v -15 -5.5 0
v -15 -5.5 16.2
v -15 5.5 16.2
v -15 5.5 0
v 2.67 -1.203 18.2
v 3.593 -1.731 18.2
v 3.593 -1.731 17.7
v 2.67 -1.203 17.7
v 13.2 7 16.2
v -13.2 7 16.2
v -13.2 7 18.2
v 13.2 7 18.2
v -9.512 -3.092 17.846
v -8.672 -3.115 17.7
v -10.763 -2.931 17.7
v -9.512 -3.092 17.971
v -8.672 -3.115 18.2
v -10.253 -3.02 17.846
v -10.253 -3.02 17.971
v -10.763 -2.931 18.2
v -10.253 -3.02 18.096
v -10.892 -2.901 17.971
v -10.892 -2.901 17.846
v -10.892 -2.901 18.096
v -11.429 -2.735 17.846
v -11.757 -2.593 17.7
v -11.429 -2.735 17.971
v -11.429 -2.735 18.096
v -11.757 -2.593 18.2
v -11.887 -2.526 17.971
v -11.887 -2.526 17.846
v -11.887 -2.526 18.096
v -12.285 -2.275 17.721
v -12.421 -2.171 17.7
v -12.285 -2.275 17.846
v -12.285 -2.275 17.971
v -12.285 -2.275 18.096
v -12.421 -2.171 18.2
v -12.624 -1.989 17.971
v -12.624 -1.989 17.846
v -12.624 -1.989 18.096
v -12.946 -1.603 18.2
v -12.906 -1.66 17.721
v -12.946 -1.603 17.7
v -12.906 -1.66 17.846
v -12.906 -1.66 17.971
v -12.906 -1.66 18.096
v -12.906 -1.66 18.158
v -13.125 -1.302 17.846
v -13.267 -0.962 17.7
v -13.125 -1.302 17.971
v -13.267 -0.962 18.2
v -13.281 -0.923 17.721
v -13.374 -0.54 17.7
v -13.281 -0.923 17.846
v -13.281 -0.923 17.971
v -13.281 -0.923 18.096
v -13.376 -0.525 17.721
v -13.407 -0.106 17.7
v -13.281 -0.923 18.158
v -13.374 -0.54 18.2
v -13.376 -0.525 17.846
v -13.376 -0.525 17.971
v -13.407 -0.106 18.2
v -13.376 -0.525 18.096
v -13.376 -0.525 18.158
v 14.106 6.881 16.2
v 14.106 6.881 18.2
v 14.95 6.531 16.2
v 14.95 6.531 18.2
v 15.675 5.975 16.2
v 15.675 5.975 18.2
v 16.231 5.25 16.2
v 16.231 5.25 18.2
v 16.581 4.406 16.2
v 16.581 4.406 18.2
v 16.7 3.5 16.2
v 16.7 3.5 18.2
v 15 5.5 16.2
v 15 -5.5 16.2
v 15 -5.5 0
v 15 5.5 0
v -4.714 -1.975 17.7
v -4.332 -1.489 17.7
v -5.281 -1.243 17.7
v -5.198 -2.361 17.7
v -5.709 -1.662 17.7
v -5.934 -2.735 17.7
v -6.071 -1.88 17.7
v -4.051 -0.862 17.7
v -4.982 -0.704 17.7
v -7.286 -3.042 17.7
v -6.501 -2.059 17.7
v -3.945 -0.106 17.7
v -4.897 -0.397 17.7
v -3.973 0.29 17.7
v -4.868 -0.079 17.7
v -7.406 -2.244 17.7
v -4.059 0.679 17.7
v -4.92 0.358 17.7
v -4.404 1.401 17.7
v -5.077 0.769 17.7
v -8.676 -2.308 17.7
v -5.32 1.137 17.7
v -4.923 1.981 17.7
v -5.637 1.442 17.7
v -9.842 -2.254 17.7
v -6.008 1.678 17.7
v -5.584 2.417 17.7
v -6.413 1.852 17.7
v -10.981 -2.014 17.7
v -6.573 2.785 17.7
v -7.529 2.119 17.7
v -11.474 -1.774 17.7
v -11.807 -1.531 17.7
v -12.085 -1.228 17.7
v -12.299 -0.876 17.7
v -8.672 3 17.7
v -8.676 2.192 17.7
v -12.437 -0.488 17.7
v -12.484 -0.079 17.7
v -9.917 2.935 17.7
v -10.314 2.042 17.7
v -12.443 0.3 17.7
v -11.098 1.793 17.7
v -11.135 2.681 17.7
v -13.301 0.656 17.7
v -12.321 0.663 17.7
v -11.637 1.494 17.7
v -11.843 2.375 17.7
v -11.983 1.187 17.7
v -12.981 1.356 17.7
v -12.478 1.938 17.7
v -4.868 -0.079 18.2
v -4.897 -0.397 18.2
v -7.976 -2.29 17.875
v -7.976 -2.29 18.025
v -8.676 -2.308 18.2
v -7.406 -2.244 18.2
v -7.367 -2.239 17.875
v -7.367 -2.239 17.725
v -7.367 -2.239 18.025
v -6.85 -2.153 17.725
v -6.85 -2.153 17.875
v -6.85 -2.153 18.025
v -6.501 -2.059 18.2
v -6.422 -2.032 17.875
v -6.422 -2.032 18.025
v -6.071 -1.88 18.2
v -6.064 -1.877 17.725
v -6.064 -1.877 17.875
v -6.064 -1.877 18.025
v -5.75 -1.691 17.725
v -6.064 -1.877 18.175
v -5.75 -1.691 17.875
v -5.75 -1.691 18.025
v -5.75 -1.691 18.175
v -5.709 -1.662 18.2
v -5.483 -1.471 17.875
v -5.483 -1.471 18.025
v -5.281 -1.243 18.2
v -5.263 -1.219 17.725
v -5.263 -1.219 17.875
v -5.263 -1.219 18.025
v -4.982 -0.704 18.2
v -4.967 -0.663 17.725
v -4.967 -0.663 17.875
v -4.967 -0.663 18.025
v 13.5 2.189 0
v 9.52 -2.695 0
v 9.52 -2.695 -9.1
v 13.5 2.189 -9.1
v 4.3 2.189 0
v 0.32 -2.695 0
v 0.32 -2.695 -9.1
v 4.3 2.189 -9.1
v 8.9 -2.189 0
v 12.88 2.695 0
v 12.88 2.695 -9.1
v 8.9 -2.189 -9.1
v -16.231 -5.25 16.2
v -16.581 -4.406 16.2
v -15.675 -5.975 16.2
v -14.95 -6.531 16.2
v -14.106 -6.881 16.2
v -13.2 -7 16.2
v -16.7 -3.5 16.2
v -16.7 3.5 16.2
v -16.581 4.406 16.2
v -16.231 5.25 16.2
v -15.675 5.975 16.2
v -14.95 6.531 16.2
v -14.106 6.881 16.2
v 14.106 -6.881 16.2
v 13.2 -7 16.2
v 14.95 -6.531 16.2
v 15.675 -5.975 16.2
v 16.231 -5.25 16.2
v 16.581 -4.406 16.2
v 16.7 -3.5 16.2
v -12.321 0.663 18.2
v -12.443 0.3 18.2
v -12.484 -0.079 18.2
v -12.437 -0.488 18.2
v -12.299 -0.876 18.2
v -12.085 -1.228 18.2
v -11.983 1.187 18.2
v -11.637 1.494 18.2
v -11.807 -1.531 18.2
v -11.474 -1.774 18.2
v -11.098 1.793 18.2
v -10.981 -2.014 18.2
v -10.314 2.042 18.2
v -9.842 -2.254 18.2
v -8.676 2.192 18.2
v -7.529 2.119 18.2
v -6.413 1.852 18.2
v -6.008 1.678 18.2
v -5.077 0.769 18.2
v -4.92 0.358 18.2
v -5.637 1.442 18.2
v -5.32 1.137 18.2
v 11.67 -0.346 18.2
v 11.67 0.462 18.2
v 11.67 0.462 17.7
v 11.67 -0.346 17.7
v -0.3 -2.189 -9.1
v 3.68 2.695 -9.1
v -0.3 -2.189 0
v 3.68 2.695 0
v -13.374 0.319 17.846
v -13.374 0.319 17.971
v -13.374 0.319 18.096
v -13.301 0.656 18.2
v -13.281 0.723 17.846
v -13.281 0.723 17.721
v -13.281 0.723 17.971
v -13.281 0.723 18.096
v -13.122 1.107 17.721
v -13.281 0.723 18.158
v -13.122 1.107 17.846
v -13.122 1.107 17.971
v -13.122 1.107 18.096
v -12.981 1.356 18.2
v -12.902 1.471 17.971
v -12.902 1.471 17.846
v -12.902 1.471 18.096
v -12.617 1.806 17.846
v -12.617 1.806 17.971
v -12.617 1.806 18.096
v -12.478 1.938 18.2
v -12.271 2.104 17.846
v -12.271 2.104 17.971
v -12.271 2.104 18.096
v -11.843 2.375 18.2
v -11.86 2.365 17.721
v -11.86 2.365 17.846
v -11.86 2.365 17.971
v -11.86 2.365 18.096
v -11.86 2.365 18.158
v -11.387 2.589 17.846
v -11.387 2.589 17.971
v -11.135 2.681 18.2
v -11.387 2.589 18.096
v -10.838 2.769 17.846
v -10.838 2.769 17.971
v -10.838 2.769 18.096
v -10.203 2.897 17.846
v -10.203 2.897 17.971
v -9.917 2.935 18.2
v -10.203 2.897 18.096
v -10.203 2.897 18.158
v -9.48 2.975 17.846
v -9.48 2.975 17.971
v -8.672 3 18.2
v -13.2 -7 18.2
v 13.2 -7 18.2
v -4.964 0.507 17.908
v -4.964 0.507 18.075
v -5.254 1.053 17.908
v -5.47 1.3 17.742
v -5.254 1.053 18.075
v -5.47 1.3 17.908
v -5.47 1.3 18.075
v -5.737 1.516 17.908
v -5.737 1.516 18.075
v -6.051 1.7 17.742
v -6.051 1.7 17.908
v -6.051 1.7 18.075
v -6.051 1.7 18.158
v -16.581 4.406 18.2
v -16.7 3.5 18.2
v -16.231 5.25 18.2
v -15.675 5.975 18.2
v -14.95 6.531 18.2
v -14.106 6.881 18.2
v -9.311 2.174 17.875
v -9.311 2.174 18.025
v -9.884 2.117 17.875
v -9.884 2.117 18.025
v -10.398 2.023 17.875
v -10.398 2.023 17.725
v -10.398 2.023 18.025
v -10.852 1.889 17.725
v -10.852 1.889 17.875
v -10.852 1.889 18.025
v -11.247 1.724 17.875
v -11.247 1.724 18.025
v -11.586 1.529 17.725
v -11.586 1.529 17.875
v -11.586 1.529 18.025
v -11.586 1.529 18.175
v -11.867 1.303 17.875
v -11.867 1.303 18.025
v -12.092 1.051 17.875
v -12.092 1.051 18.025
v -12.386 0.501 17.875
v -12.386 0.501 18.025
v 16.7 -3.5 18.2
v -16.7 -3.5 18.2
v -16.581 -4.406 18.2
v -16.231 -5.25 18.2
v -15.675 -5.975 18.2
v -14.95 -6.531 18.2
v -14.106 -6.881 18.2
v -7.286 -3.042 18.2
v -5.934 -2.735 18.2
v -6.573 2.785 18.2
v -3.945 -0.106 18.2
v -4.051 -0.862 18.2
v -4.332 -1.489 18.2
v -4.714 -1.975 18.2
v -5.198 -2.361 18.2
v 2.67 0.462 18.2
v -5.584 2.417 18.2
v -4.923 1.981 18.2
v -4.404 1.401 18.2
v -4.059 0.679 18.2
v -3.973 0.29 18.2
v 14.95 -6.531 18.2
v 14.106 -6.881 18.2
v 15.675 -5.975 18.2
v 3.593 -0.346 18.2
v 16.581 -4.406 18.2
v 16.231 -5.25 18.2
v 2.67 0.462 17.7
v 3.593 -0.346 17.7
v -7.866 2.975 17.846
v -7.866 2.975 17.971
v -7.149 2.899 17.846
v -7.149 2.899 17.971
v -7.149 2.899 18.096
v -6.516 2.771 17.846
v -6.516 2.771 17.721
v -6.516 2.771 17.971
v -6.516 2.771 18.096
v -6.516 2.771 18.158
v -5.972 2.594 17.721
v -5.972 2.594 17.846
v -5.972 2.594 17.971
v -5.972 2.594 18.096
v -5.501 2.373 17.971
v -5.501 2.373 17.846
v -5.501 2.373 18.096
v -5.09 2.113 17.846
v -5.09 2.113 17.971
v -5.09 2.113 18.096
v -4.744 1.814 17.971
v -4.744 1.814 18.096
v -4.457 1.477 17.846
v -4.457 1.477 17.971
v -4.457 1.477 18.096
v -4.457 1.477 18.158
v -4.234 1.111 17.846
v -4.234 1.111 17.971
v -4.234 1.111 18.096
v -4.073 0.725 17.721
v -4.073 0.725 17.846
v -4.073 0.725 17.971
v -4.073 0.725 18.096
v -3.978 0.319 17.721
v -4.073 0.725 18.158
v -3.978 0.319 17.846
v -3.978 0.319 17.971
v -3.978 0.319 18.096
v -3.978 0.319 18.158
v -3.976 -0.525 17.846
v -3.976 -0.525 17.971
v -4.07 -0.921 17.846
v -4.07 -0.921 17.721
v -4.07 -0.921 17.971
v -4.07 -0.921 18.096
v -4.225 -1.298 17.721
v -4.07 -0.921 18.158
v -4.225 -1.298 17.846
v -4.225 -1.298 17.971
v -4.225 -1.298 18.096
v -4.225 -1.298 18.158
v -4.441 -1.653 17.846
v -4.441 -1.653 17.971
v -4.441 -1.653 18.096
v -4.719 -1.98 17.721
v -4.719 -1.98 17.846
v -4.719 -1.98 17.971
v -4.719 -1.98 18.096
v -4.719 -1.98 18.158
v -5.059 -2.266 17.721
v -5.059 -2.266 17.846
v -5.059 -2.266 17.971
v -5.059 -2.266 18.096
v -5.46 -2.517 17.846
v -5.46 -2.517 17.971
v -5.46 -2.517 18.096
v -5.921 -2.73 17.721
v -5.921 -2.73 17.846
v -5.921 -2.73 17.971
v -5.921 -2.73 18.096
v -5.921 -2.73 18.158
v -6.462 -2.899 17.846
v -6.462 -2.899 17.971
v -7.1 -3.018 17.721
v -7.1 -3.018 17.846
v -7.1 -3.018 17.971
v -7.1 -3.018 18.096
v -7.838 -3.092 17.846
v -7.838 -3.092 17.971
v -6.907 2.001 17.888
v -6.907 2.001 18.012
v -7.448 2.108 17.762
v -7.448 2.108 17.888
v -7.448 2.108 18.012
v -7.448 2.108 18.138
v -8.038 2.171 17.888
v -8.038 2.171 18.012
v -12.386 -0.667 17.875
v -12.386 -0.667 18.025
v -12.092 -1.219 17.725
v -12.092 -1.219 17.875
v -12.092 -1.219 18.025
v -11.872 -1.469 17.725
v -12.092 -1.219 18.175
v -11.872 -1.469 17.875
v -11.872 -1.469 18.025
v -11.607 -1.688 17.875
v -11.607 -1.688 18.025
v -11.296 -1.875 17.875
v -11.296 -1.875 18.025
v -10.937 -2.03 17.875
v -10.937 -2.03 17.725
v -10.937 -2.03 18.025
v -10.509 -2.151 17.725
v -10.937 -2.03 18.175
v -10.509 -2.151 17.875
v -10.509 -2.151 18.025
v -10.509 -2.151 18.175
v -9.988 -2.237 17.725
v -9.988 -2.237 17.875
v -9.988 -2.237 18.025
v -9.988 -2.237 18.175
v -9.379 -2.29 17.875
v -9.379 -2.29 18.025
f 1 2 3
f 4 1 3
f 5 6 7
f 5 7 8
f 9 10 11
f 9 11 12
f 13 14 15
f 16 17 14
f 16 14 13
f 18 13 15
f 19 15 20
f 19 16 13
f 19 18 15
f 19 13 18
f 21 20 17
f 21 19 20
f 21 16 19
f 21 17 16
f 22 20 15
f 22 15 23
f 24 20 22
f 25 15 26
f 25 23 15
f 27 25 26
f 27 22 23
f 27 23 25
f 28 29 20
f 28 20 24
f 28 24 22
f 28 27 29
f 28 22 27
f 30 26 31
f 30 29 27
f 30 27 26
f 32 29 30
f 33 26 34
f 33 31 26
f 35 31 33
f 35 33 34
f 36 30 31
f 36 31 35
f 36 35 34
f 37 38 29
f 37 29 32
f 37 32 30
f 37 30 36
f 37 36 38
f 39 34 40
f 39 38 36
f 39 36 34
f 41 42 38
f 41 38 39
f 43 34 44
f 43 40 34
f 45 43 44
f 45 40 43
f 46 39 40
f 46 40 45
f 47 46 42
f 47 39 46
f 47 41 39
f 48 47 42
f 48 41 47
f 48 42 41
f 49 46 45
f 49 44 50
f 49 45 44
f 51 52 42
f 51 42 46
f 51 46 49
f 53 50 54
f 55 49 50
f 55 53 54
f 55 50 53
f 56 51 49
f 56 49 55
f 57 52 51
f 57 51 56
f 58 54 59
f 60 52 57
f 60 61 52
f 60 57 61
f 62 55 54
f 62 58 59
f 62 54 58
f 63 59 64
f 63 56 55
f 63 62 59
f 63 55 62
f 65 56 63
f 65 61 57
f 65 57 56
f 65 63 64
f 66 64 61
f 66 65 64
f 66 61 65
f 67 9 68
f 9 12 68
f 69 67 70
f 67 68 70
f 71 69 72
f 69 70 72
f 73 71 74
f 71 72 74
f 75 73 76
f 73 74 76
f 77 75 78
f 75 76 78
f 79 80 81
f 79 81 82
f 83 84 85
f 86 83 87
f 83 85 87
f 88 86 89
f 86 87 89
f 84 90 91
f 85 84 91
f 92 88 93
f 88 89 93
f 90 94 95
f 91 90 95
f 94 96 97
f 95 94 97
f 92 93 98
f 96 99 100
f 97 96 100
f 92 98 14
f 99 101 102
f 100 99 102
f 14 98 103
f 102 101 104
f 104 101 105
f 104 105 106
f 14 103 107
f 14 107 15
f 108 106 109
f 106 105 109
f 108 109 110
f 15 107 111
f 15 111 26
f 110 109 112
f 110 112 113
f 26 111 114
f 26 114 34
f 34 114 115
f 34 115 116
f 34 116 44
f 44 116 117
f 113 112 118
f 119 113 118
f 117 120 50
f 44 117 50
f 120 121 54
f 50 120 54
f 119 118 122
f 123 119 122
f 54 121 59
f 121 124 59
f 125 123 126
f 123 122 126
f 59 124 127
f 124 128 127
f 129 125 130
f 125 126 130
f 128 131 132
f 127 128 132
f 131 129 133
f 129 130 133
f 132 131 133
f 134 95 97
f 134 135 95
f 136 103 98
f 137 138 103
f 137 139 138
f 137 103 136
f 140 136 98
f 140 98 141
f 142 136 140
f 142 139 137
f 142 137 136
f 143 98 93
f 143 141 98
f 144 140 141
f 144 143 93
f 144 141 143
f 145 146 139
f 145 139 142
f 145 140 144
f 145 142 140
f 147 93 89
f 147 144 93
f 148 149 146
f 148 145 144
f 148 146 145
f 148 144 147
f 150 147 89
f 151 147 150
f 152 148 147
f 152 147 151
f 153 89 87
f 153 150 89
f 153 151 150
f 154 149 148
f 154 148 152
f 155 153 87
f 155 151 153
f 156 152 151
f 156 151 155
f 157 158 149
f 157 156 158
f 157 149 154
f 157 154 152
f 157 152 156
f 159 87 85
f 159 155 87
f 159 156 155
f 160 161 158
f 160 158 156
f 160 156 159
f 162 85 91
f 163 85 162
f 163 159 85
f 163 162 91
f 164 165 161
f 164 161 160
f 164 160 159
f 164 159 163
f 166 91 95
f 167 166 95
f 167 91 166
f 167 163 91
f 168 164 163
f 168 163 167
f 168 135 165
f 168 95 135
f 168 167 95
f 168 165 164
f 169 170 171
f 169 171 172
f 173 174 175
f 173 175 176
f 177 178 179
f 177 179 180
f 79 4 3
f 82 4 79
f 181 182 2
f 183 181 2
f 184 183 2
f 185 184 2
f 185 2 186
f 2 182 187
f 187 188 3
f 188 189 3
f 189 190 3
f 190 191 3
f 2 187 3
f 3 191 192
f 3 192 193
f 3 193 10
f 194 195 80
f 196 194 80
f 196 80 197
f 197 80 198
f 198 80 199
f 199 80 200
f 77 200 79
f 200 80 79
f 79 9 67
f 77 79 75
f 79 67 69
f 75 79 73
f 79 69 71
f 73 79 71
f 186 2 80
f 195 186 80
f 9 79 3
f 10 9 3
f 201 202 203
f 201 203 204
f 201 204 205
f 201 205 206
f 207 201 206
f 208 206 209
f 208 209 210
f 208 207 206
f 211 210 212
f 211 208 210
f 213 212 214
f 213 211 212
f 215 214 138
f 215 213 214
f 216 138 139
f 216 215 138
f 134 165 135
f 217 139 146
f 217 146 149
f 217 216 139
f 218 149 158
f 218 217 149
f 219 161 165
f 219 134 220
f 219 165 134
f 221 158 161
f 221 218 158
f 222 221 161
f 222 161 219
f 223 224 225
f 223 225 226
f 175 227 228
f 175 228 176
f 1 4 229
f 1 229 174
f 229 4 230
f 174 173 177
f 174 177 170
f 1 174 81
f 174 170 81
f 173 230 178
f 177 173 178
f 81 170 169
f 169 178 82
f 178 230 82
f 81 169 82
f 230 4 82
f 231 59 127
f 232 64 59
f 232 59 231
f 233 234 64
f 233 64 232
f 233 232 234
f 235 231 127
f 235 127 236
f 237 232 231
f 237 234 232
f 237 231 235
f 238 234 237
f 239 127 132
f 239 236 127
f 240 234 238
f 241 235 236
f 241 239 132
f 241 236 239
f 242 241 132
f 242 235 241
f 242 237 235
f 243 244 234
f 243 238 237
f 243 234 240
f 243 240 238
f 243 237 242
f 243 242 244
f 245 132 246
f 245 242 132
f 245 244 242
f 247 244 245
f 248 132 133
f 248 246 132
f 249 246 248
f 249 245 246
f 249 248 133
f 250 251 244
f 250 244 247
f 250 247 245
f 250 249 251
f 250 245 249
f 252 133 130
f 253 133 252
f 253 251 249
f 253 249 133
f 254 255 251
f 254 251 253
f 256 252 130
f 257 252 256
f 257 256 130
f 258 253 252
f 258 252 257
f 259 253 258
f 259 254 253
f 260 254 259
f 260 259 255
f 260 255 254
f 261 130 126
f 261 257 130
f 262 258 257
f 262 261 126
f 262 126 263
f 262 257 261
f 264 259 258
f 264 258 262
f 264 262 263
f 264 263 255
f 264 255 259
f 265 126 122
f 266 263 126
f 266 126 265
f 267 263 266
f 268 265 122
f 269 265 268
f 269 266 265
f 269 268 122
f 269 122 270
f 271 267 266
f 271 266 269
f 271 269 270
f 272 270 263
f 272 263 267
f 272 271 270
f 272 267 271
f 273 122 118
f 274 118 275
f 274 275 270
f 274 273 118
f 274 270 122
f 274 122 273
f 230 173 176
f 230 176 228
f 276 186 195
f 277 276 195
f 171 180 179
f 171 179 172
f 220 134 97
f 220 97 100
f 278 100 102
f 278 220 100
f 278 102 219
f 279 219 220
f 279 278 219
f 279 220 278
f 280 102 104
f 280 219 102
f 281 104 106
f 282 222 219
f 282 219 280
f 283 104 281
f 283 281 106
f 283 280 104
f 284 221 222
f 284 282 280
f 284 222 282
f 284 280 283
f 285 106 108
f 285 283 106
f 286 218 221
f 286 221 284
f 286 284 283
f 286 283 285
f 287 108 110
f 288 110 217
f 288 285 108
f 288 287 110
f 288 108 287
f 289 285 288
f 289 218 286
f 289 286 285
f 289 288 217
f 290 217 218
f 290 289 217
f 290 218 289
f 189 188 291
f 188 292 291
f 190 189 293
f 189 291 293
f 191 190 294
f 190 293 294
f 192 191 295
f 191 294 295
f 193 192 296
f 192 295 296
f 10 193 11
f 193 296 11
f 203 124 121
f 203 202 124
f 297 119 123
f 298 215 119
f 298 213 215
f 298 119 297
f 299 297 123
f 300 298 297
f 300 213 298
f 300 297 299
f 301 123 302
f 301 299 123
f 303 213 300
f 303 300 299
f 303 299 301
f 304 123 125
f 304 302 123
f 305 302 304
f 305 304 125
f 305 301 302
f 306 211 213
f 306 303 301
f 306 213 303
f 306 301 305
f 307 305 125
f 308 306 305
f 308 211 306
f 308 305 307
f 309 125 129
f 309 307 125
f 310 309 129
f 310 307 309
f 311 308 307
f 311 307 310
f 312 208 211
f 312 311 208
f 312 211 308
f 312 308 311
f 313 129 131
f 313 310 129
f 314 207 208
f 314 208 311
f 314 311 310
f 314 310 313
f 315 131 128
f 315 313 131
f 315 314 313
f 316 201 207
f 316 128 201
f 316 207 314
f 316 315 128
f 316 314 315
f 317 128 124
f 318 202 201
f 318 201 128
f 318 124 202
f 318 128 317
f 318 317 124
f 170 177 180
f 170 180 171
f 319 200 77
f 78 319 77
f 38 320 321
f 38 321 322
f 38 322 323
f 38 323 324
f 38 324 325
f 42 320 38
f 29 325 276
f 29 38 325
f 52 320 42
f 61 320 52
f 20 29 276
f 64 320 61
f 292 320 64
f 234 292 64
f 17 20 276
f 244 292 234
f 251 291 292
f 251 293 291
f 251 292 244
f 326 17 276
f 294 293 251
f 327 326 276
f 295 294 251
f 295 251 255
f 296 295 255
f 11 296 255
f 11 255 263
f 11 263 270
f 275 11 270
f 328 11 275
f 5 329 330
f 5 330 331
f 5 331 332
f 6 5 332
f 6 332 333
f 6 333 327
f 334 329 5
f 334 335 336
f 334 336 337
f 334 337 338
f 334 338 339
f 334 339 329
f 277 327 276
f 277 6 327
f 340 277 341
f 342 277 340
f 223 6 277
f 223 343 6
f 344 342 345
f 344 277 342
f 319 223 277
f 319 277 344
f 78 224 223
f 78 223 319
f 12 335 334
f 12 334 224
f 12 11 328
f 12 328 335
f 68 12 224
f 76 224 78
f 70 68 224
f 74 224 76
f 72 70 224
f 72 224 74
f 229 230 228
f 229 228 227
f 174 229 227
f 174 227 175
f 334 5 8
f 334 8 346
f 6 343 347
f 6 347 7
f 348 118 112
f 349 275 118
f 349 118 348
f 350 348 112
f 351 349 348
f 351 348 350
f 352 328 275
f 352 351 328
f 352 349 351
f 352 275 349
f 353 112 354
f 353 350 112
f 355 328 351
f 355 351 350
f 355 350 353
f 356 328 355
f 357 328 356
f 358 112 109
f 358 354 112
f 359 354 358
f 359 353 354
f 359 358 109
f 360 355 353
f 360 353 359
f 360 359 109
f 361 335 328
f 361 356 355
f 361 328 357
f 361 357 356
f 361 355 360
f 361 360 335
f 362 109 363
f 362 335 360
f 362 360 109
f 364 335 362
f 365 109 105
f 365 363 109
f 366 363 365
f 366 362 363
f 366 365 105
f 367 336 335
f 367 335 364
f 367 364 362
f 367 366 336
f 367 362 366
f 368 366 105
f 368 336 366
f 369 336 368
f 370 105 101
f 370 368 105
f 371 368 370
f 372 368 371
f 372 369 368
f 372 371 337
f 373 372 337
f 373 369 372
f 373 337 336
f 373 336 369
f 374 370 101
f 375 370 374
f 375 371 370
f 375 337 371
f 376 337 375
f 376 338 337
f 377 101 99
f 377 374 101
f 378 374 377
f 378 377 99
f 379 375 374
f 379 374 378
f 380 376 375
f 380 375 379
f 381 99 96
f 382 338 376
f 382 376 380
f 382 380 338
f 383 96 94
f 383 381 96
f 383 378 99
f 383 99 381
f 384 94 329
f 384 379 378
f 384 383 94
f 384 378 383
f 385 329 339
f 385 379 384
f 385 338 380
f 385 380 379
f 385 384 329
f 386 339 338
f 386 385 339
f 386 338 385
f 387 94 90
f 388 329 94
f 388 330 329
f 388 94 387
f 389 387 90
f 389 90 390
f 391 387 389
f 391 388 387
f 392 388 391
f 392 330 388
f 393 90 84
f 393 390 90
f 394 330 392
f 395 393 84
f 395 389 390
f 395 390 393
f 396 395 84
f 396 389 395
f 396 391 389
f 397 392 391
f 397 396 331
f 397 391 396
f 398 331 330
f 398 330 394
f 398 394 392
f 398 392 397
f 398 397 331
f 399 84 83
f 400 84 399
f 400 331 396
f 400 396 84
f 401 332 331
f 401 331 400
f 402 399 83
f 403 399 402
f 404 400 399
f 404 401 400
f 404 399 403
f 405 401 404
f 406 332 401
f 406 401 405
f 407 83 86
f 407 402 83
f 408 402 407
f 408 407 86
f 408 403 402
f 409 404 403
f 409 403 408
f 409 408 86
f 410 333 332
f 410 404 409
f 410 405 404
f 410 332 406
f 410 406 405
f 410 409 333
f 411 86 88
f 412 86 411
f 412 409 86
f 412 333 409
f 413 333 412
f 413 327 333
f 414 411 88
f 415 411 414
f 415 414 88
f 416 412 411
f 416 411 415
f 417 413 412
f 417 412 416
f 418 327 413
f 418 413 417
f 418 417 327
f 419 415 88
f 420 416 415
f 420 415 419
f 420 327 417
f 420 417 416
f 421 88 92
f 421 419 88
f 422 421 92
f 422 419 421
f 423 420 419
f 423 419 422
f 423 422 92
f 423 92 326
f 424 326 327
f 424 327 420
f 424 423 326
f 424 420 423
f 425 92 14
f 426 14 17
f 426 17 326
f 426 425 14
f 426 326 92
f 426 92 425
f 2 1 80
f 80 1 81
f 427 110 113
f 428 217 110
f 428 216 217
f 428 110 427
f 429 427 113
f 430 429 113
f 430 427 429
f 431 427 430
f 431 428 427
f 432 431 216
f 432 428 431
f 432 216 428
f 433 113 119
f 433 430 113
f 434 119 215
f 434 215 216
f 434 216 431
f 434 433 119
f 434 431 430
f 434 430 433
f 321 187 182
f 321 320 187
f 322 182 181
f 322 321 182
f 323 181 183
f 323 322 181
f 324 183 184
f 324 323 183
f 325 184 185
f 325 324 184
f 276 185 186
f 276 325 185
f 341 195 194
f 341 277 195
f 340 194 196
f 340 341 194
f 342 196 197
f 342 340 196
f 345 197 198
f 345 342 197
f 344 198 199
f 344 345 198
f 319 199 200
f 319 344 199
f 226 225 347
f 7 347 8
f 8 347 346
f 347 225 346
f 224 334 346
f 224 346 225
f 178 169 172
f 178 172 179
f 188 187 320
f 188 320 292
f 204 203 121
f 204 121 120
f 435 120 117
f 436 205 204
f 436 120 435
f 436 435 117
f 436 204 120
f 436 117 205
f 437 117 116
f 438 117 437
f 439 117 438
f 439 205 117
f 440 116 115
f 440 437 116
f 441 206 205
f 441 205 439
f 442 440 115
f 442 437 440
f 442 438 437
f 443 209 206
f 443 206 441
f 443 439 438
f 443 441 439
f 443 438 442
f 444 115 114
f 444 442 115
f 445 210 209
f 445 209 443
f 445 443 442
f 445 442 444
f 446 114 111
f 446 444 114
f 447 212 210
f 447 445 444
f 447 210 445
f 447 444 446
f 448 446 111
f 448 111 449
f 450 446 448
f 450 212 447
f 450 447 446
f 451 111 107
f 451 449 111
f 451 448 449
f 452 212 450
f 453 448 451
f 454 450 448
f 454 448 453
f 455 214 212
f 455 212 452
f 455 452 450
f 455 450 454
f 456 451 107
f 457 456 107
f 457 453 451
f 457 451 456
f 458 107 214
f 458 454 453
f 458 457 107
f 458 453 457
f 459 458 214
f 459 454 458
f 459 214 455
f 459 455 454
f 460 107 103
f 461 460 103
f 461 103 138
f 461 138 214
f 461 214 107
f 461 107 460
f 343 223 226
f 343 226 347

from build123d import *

# Parameters (mm, degrees)
ESQUISSE1_W             = 30
ESQUISSE1_H             = 11
BOSS_EXTRU_1_DEPTH      = 16.2
BOSS_EXTRU_2_DEPTH      = 9.1
ESQUISSE3_W             = 33.4
ESQUISSE3_H             = 14
BOSS_EXTRU_3_DEPTH      = 2
CONG_1_R                = 3.5
ENL_V_MAT_EXTRU_1_DEPTH = 0.5


with BuildPart() as part:
    # Esquisse1 → Boss.-Extru.1 (new body)
    with BuildSketch(Plane.XY):
        Rectangle(ESQUISSE1_W, ESQUISSE1_H)
    extrude(amount=BOSS_EXTRU_1_DEPTH)

    # Esquisse2 → Boss.-Extru.2 (add)
    with BuildSketch(Plane(origin=(0, 0, 0), x_dir=(-1, 0, 0), z_dir=(0, 0, -1))):
        Polygon((-9.520156546, -2.694554874), (-13.5, 2.189177928), (-12.879843454, 2.694554874), (-8.9, -2.189177928), align=None)
        Polygon((-0.320156546, -2.694554874), (-4.3, 2.189177928), (-3.679843454, 2.694554874), (0.3, -2.189177928), align=None)
    extrude(amount=BOSS_EXTRU_2_DEPTH)

    # Esquisse3 → Boss.-Extru.3 (add)
    with BuildSketch(Plane.XY.offset(16.2)):
        Rectangle(ESQUISSE3_W, ESQUISSE3_H)
    extrude(amount=BOSS_EXTRU_3_DEPTH)

    # Congé1
    cong_1_edges = [part.edges().sort_by_distance(p)[0] for p in [
        (16.7, -7, 17.2),
        (16.7, 7, 17.2),
        (-16.7, 7, 17.2),
        (-16.7, -7, 17.2),
    ]]
    fillet(cong_1_edges, radius=CONG_1_R)

    # Esquisse5 → Enlèv. mat.-Extru.1 (cut)
    # profile 1 of 2: a face of its own
    with BuildSketch(Plane.XY.offset(18.2)):
        with BuildLine():
            add(Edge.make_bspline(
                [(-8.672344116, -3.115384615), (-8.816594542, -3.11454114), (-9.096803073, -3.112902677), (-9.505106438, -3.094675309), (-9.888147182, -3.064395858), (-10.245943635, -3.022899755), (-10.578588179, -2.972402097), (-10.885191819, -2.904990826), (-11.167173735, -2.828329399), (-11.425453052, -2.739480033), (-11.663510816, -2.639226475), (-11.885744181, -2.530107135), (-12.0918336, -2.40780713), (-12.285008724, -2.279261226), (-12.462319222, -2.139465144), (-12.62580805, -1.99141638), (-12.774096473, -1.832153938), (-12.907286041, -1.663222517), (-13.024073857, -1.485767046), (-13.127578093, -1.304636715), (-13.212833981, -1.116595132), (-13.282575645, -0.924117757), (-13.339507374, -0.72679892), (-13.378613639, -0.524688996), (-13.403175484, -0.317319479), (-13.405526699, -0.177353753), (-13.406719116, -0.106370192)],
                knots=[0, 0, 0, 0, 1.646148282, 3.197666765, 4.66315463, 6.030252048, 7.307778049, 8.501004361, 9.610818041, 10.641065266, 11.615491391, 12.557119604, 13.464013759, 14.348536654, 15.203310953, 16.038349431, 16.863300206, 17.683791446, 18.490318933, 19.285717724, 20.06220424, 20.843281102, 21.620494212, 22.403315558, 23.190242141, 24, 24, 24, 24], degree=3))
            add(Edge.make_bspline(
                [(-13.406719116, -0.106370192), (-13.405725902, -0.034758535), (-13.403749756, 0.107723458), (-13.375934308, 0.317616697), (-13.340032104, 0.523853953), (-13.28245088, 0.7233062), (-13.213547479, 0.919744698), (-13.122630536, 1.108284414), (-13.0237513, 1.295581798), (-12.90312695, 1.47312818), (-12.769817193, 1.646228322), (-12.618476538, 1.808491632), (-12.453293353, 1.964065993), (-12.270583572, 2.107075425), (-12.073148677, 2.243649111), (-11.859333594, 2.368602577), (-11.629612167, 2.484534626), (-11.385049352, 2.593624475), (-11.119112495, 2.689020666), (-10.833460316, 2.773835506), (-10.525506096, 2.843355619), (-10.196965336, 2.90084753), (-9.846210449, 2.945472196), (-9.473952104, 2.977949275), (-9.079957413, 2.995110587), (-8.810580002, 2.99834183), (-8.672344116, 3)],
                knots=[0, 0, 0, 0, 0.810910589, 1.61342667, 2.396193133, 3.181089899, 3.963115317, 4.752255436, 5.550715454, 6.36105385, 7.181178335, 8.024612154, 8.872680183, 9.750181803, 10.651284446, 11.591556747, 12.554036451, 13.566402641, 14.62422919, 15.753422176, 16.94128843, 18.199818041, 19.531985927, 20.947085226, 22.433341622, 24, 24, 24, 24], degree=3))
            add(Edge.make_bspline(
                [(-8.672344116, 3), (-8.534712415, 2.998305349), (-8.265942373, 2.994995999), (-7.873701987, 2.978317337), (-7.503450196, 2.944678932), (-7.154792256, 2.903215364), (-6.827566515, 2.845080871), (-6.521986194, 2.775033615), (-6.2369694, 2.695225184), (-5.974558239, 2.598364918), (-5.730419815, 2.491814224), (-5.502387515, 2.376006578), (-5.288628898, 2.251758245), (-5.090673237, 2.117232847), (-4.908696823, 1.971871056), (-4.74294709, 1.816405738), (-4.590643844, 1.652725679), (-4.455865409, 1.478616394), (-4.334322685, 1.299416276), (-4.231855178, 1.112099864), (-4.143073095, 0.921461088), (-4.070485552, 0.725596603), (-4.014193065, 0.524808811), (-3.975495046, 0.318430198), (-3.948293311, 0.107693838), (-3.9462218, -0.034768443), (-3.945180655, -0.106370192)],
                knots=[0, 0, 0, 0, 1.561645053, 3.049612875, 4.452756685, 5.778837748, 7.032101753, 8.221335837, 9.334924186, 10.387562255, 11.392109817, 12.355697819, 13.287721948, 14.19548756, 15.068665045, 15.927346723, 16.771751757, 17.602390507, 18.423119567, 19.225778204, 20.022010933, 20.807278863, 21.593079439, 22.384715467, 23.188155646, 24, 24, 24, 24], degree=3))
            add(Edge.make_bspline(
                [(-3.945180655, -0.106370192), (-3.946379855, -0.1773522), (-3.948744442, -0.317314863), (-3.973208323, -0.524706815), (-4.012539618, -0.726004524), (-4.067610881, -0.922201329), (-4.13502048, -1.114303766), (-4.22284416, -1.299694332), (-4.323989205, -1.480433653), (-4.439176304, -1.65604218), (-4.571150652, -1.823209934), (-4.717099564, -1.982916346), (-4.880765666, -2.131001619), (-5.059572209, -2.269585542), (-5.253034743, -2.399490408), (-5.461283099, -2.520733579), (-5.684672864, -2.632141235), (-5.924612019, -2.734107607), (-6.184724486, -2.824512173), (-6.467425199, -2.904059364), (-6.775585556, -2.967591262), (-7.107640965, -3.021444367), (-7.464266137, -3.064597565), (-7.845590095, -3.094662735), (-8.250888737, -3.11288884), (-8.529295376, -3.114537509), (-8.672344116, -3.115384615)],
                knots=[0, 0, 0, 0, 0.810927267, 1.598990287, 2.382942141, 3.152806972, 3.926217614, 4.706701772, 5.493896336, 6.292070767, 7.104102563, 7.925577746, 8.761822141, 9.623241997, 10.509042271, 11.423174113, 12.375371989, 13.360203808, 14.400680605, 15.520553799, 16.714061498, 17.994519714, 19.364400916, 20.818312473, 22.365209998, 24, 24, 24, 24], degree=3))
        make_face()
        with BuildLine():
            add(Edge.make_bspline(
                [(-8.675949886, -2.307692308), (-8.555739426, -2.307378423), (-8.32243453, -2.306769235), (-7.984001554, -2.291315187), (-7.667814755, -2.269804728), (-7.373997537, -2.242743333), (-7.103576783, -2.202215046), (-6.855428255, -2.156233227), (-6.630011273, -2.10108084), (-6.425355958, -2.035503901), (-6.238564308, -1.960805385), (-6.064657667, -1.879390931), (-5.901574914, -1.791153635), (-5.749711712, -1.694284826), (-5.610924423, -1.58686934), (-5.481695105, -1.47388697), (-5.366518241, -1.350247925), (-5.228358565, -1.179245905), (-5.085597394, -0.953479952), (-4.961278178, -0.669028437), (-4.883152037, -0.376737863), (-4.873216642, -0.17834897), (-4.868257578, -0.079326923)],
                knots=[0, 0, 0, 0, 1.459098681, 2.831824031, 4.11146945, 5.306290378, 6.412266529, 7.42953815, 8.369053297, 9.227277979, 10.03601793, 10.809473603, 11.557037441, 12.285528272, 12.993193355, 13.685654407, 14.36688038, 15.041354379, 16.352855396, 17.594313975, 18.799247529, 20, 20, 20, 20], degree=3))
            add(Edge.make_bspline(
                [(-4.868257578, -0.079326923), (-4.872599831, 0.020268324), (-4.881268934, 0.219105532), (-4.956929449, 0.511127608), (-5.079929419, 0.792278573), (-5.220453969, 1.014159934), (-5.355136893, 1.182494904), (-5.469834642, 1.303148633), (-5.598299711, 1.413876824), (-5.736895921, 1.518900078), (-5.88828286, 1.615223199), (-6.051729325, 1.702814186), (-6.227690112, 1.782742777), (-6.350526578, 1.828280326), (-6.413329693, 1.8515625)],
                knots=[0, 0, 0, 0, 1.353621445, 2.702441307, 4.075953605, 5.516772412, 6.261413105, 7.007624062, 7.778524365, 8.566925914, 9.372323995, 10.217594641, 11.088702136, 12, 12, 12, 12], degree=3))
            add(Edge.make_bspline(
                [(-6.413329693, 1.8515625), (-6.493634738, 1.878695617), (-6.656688417, 1.933787481), (-6.909623522, 2.004789187), (-7.175002058, 2.060705927), (-7.451238073, 2.111011725), (-7.740368732, 2.145348154), (-8.041499434, 2.172985389), (-8.354857222, 2.189264298), (-8.567758628, 2.191282229), (-8.675949886, 2.192307692)],
                knots=[0, 0, 0, 0, 0.884706709, 1.796334032, 2.740027952, 3.714592787, 4.726048262, 5.777819803, 6.87074269, 8, 8, 8, 8], degree=3))
            add(Edge.make_bspline(
                [(-8.675949886, 2.192307692), (-8.784123643, 2.19089292), (-8.995734639, 2.188125323), (-9.305638532, 2.177546497), (-9.599984203, 2.150228735), (-9.880039702, 2.119888142), (-10.144254773, 2.075152436), (-10.394841251, 2.026918055), (-10.628694816, 1.962115009), (-10.849476345, 1.892892484), (-11.054678905, 1.813666605), (-11.245254183, 1.726451773), (-11.422139784, 1.633320403), (-11.584789178, 1.53211866), (-11.734145807, 1.424256181), (-11.866772982, 1.305865626), (-11.989122286, 1.184465672), (-12.12628489, 1.011809345), (-12.267242107, 0.787609853), (-12.393430821, 0.506705562), (-12.468112707, 0.21598173), (-12.47846943, 0.019038319), (-12.483642193, -0.079326923)],
                knots=[0, 0, 0, 0, 1.313483664, 2.569454835, 3.763100662, 4.901599063, 5.988328865, 7.015709358, 7.99797933, 8.932480776, 9.824041341, 10.666387587, 11.475829342, 12.24921787, 12.990555181, 13.709176526, 14.405678811, 15.080244297, 16.38186033, 17.610124501, 18.806354173, 20, 20, 20, 20], degree=3))
            add(Edge.make_bspline(
                [(-12.483642193, -0.079326923), (-12.478456561, -0.178883567), (-12.468075849, -0.378178222), (-12.393776202, -0.672006713), (-12.267611311, -0.954808682), (-12.12655646, -1.179747502), (-11.989648182, -1.350306344), (-11.873123474, -1.471338898), (-11.74698074, -1.585888179), (-11.606962249, -1.690522154), (-11.455634138, -1.786816559), (-11.29466033, -1.87846391), (-11.120428745, -1.958789639), (-10.933783565, -2.033727971), (-10.729116994, -2.099414291), (-10.502884375, -2.1539365), (-10.254143251, -2.203572524), (-9.981746648, -2.239318551), (-9.687866721, -2.270795303), (-9.370871329, -2.291079041), (-9.031276204, -2.30684003), (-8.796764226, -2.307402525), (-8.675949886, -2.307692308)],
                knots=[0, 0, 0, 0, 1.207546505, 2.417292871, 3.651582144, 4.952510111, 5.626719005, 6.30238548, 6.989136872, 7.692112372, 8.420316868, 9.164734959, 9.937886623, 10.746308695, 11.604196049, 12.543341915, 13.568754172, 14.680483261, 15.875568977, 17.154711427, 18.534182925, 20, 20, 20, 20], degree=3))
        make_face(mode=Mode.SUBTRACT)
    # profile 2 of 2: a face of its own
    with BuildSketch(Plane.XY.offset(18.2)):
        Polygon((2.670203961, -1.202524038), (2.670203961, 0.461538462), (11.670203961, 0.461538462), (11.670203961, -0.346153846), (3.593280884, -0.346153846), (3.593280884, -1.730769231), align=None)
    extrude(amount=-ENL_V_MAT_EXTRU_1_DEPTH, mode=Mode.SUBTRACT)


solid = part.part
